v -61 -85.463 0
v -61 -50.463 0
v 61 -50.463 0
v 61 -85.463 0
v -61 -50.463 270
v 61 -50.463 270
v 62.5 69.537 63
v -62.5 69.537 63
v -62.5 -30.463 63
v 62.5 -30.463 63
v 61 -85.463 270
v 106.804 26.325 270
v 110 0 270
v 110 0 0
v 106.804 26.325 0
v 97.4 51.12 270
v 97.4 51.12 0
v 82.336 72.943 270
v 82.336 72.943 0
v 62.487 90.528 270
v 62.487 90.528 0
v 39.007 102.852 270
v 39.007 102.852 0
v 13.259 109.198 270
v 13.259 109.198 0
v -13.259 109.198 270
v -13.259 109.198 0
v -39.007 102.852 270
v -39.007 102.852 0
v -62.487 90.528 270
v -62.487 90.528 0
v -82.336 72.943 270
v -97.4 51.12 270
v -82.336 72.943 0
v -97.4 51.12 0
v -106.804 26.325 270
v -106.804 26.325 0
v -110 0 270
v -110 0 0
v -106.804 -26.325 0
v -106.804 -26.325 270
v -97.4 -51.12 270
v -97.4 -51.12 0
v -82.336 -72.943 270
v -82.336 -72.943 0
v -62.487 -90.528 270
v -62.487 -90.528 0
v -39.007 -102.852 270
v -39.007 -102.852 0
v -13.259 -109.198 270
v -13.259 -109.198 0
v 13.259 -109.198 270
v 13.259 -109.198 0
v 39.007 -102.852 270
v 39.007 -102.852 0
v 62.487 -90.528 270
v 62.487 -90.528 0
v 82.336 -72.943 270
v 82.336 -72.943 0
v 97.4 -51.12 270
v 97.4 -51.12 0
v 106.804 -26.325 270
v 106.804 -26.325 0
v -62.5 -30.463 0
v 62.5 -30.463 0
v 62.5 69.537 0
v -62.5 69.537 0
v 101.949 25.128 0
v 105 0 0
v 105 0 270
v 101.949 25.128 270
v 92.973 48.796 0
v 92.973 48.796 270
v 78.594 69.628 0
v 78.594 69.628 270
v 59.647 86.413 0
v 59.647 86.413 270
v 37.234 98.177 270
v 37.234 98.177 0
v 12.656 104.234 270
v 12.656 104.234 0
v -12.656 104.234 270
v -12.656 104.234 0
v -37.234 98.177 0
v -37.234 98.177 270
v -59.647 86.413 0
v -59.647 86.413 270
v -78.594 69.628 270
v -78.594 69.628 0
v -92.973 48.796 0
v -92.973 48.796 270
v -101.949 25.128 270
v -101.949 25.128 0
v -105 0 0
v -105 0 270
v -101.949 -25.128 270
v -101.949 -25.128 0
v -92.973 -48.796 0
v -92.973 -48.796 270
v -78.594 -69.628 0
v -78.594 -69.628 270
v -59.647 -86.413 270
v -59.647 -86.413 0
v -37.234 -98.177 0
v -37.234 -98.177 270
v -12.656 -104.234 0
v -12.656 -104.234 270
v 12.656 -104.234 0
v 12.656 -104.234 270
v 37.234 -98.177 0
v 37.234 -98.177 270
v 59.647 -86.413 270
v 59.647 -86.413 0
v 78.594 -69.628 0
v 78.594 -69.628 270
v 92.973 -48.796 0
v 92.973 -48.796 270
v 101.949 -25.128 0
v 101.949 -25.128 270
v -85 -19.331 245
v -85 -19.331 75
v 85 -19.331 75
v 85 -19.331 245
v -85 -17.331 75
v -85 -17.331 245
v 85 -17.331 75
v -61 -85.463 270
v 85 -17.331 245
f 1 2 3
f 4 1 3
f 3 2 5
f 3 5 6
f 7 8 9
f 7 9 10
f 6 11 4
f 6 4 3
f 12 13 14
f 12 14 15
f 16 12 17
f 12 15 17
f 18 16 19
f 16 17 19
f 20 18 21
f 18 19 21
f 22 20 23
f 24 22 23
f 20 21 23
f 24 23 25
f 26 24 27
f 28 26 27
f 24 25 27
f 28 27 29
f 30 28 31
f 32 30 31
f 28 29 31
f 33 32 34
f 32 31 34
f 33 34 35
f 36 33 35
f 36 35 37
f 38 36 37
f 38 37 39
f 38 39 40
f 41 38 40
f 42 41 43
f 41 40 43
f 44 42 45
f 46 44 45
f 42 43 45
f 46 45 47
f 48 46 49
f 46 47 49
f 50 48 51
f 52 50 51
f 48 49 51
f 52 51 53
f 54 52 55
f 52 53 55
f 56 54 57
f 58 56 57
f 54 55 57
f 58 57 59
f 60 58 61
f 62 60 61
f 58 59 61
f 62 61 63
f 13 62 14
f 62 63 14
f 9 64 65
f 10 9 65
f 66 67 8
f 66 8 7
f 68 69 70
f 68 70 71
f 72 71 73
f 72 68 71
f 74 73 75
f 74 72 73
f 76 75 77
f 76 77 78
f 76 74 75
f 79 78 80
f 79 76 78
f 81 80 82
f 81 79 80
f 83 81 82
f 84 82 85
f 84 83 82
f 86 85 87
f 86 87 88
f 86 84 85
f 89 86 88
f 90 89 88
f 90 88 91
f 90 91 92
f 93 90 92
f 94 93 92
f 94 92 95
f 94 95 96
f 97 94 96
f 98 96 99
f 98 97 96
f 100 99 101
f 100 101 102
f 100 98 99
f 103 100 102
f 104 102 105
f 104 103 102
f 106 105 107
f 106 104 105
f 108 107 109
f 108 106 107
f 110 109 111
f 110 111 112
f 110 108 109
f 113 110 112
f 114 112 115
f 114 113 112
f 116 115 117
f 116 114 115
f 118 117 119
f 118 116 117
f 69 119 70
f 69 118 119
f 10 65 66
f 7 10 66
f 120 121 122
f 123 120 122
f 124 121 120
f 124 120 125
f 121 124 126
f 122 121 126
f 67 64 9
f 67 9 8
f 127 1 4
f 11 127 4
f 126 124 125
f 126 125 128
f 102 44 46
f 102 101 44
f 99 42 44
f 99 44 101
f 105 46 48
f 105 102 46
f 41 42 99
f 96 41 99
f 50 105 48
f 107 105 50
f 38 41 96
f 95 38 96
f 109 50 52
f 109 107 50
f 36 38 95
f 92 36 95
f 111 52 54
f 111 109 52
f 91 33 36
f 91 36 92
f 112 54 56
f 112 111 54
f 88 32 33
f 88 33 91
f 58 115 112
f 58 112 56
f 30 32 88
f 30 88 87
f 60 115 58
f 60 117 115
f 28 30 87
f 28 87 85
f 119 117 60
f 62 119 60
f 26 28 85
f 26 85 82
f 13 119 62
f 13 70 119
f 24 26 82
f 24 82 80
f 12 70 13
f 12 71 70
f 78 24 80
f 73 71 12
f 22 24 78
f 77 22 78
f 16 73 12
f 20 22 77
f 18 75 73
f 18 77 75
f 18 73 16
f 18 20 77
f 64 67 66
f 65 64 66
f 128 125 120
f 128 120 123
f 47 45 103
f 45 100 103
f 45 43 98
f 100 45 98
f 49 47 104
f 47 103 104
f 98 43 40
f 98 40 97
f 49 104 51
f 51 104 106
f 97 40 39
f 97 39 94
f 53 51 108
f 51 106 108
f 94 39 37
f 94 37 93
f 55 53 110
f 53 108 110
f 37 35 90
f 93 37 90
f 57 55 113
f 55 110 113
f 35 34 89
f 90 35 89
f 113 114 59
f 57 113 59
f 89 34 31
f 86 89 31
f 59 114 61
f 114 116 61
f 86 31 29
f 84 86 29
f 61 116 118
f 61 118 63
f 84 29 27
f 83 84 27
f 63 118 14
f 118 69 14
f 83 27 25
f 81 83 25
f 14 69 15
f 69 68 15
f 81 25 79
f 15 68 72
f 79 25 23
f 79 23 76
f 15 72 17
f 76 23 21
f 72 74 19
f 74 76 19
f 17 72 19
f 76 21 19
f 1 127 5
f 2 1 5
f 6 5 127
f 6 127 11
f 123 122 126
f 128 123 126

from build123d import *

# Parameters (mm, degrees)
F1_W     = 125
F1_H     = 100
F2_DEPTH = 63
F4_W     = 170
F4_H     = 2
F5_DEPTH = 170
F0_W     = 122
F0_H     = 35
F6_DEPTH = 270
F7_R     = 110
F7_R_2   = 105
F8_DEPTH = 270


with BuildPart() as f2:
    # F1 (on Top) → F2 (new body)
    with BuildSketch(Plane.XY):
        with Locations((0, 19.536558)):
            Rectangle(F1_W, F1_H)
    extrude(amount=F2_DEPTH)


with BuildPart() as f5:
    # F4 (on offset) → F5 (new body)
    with BuildSketch(Plane.XY.offset(75)):
        with Locations((0, -18.330927)):
            Rectangle(F4_W, F4_H)
    extrude(amount=F5_DEPTH)


with BuildPart() as f6:
    # F0 (on Top) → F6 (new body)
    with BuildSketch(Plane.XY):
        with Locations((0, -67.963442)):
            Rectangle(F0_W, F0_H)
    extrude(amount=F6_DEPTH)


with BuildPart() as f8:
    # F7 (on Top) → F8 (new body)
    with BuildSketch(Plane.XY):
        Circle(F7_R)
        Circle(F7_R_2, mode=Mode.SUBTRACT)
    extrude(amount=F8_DEPTH)


solid = Compound([f2.part, f5.part, f6.part, f8.part])
